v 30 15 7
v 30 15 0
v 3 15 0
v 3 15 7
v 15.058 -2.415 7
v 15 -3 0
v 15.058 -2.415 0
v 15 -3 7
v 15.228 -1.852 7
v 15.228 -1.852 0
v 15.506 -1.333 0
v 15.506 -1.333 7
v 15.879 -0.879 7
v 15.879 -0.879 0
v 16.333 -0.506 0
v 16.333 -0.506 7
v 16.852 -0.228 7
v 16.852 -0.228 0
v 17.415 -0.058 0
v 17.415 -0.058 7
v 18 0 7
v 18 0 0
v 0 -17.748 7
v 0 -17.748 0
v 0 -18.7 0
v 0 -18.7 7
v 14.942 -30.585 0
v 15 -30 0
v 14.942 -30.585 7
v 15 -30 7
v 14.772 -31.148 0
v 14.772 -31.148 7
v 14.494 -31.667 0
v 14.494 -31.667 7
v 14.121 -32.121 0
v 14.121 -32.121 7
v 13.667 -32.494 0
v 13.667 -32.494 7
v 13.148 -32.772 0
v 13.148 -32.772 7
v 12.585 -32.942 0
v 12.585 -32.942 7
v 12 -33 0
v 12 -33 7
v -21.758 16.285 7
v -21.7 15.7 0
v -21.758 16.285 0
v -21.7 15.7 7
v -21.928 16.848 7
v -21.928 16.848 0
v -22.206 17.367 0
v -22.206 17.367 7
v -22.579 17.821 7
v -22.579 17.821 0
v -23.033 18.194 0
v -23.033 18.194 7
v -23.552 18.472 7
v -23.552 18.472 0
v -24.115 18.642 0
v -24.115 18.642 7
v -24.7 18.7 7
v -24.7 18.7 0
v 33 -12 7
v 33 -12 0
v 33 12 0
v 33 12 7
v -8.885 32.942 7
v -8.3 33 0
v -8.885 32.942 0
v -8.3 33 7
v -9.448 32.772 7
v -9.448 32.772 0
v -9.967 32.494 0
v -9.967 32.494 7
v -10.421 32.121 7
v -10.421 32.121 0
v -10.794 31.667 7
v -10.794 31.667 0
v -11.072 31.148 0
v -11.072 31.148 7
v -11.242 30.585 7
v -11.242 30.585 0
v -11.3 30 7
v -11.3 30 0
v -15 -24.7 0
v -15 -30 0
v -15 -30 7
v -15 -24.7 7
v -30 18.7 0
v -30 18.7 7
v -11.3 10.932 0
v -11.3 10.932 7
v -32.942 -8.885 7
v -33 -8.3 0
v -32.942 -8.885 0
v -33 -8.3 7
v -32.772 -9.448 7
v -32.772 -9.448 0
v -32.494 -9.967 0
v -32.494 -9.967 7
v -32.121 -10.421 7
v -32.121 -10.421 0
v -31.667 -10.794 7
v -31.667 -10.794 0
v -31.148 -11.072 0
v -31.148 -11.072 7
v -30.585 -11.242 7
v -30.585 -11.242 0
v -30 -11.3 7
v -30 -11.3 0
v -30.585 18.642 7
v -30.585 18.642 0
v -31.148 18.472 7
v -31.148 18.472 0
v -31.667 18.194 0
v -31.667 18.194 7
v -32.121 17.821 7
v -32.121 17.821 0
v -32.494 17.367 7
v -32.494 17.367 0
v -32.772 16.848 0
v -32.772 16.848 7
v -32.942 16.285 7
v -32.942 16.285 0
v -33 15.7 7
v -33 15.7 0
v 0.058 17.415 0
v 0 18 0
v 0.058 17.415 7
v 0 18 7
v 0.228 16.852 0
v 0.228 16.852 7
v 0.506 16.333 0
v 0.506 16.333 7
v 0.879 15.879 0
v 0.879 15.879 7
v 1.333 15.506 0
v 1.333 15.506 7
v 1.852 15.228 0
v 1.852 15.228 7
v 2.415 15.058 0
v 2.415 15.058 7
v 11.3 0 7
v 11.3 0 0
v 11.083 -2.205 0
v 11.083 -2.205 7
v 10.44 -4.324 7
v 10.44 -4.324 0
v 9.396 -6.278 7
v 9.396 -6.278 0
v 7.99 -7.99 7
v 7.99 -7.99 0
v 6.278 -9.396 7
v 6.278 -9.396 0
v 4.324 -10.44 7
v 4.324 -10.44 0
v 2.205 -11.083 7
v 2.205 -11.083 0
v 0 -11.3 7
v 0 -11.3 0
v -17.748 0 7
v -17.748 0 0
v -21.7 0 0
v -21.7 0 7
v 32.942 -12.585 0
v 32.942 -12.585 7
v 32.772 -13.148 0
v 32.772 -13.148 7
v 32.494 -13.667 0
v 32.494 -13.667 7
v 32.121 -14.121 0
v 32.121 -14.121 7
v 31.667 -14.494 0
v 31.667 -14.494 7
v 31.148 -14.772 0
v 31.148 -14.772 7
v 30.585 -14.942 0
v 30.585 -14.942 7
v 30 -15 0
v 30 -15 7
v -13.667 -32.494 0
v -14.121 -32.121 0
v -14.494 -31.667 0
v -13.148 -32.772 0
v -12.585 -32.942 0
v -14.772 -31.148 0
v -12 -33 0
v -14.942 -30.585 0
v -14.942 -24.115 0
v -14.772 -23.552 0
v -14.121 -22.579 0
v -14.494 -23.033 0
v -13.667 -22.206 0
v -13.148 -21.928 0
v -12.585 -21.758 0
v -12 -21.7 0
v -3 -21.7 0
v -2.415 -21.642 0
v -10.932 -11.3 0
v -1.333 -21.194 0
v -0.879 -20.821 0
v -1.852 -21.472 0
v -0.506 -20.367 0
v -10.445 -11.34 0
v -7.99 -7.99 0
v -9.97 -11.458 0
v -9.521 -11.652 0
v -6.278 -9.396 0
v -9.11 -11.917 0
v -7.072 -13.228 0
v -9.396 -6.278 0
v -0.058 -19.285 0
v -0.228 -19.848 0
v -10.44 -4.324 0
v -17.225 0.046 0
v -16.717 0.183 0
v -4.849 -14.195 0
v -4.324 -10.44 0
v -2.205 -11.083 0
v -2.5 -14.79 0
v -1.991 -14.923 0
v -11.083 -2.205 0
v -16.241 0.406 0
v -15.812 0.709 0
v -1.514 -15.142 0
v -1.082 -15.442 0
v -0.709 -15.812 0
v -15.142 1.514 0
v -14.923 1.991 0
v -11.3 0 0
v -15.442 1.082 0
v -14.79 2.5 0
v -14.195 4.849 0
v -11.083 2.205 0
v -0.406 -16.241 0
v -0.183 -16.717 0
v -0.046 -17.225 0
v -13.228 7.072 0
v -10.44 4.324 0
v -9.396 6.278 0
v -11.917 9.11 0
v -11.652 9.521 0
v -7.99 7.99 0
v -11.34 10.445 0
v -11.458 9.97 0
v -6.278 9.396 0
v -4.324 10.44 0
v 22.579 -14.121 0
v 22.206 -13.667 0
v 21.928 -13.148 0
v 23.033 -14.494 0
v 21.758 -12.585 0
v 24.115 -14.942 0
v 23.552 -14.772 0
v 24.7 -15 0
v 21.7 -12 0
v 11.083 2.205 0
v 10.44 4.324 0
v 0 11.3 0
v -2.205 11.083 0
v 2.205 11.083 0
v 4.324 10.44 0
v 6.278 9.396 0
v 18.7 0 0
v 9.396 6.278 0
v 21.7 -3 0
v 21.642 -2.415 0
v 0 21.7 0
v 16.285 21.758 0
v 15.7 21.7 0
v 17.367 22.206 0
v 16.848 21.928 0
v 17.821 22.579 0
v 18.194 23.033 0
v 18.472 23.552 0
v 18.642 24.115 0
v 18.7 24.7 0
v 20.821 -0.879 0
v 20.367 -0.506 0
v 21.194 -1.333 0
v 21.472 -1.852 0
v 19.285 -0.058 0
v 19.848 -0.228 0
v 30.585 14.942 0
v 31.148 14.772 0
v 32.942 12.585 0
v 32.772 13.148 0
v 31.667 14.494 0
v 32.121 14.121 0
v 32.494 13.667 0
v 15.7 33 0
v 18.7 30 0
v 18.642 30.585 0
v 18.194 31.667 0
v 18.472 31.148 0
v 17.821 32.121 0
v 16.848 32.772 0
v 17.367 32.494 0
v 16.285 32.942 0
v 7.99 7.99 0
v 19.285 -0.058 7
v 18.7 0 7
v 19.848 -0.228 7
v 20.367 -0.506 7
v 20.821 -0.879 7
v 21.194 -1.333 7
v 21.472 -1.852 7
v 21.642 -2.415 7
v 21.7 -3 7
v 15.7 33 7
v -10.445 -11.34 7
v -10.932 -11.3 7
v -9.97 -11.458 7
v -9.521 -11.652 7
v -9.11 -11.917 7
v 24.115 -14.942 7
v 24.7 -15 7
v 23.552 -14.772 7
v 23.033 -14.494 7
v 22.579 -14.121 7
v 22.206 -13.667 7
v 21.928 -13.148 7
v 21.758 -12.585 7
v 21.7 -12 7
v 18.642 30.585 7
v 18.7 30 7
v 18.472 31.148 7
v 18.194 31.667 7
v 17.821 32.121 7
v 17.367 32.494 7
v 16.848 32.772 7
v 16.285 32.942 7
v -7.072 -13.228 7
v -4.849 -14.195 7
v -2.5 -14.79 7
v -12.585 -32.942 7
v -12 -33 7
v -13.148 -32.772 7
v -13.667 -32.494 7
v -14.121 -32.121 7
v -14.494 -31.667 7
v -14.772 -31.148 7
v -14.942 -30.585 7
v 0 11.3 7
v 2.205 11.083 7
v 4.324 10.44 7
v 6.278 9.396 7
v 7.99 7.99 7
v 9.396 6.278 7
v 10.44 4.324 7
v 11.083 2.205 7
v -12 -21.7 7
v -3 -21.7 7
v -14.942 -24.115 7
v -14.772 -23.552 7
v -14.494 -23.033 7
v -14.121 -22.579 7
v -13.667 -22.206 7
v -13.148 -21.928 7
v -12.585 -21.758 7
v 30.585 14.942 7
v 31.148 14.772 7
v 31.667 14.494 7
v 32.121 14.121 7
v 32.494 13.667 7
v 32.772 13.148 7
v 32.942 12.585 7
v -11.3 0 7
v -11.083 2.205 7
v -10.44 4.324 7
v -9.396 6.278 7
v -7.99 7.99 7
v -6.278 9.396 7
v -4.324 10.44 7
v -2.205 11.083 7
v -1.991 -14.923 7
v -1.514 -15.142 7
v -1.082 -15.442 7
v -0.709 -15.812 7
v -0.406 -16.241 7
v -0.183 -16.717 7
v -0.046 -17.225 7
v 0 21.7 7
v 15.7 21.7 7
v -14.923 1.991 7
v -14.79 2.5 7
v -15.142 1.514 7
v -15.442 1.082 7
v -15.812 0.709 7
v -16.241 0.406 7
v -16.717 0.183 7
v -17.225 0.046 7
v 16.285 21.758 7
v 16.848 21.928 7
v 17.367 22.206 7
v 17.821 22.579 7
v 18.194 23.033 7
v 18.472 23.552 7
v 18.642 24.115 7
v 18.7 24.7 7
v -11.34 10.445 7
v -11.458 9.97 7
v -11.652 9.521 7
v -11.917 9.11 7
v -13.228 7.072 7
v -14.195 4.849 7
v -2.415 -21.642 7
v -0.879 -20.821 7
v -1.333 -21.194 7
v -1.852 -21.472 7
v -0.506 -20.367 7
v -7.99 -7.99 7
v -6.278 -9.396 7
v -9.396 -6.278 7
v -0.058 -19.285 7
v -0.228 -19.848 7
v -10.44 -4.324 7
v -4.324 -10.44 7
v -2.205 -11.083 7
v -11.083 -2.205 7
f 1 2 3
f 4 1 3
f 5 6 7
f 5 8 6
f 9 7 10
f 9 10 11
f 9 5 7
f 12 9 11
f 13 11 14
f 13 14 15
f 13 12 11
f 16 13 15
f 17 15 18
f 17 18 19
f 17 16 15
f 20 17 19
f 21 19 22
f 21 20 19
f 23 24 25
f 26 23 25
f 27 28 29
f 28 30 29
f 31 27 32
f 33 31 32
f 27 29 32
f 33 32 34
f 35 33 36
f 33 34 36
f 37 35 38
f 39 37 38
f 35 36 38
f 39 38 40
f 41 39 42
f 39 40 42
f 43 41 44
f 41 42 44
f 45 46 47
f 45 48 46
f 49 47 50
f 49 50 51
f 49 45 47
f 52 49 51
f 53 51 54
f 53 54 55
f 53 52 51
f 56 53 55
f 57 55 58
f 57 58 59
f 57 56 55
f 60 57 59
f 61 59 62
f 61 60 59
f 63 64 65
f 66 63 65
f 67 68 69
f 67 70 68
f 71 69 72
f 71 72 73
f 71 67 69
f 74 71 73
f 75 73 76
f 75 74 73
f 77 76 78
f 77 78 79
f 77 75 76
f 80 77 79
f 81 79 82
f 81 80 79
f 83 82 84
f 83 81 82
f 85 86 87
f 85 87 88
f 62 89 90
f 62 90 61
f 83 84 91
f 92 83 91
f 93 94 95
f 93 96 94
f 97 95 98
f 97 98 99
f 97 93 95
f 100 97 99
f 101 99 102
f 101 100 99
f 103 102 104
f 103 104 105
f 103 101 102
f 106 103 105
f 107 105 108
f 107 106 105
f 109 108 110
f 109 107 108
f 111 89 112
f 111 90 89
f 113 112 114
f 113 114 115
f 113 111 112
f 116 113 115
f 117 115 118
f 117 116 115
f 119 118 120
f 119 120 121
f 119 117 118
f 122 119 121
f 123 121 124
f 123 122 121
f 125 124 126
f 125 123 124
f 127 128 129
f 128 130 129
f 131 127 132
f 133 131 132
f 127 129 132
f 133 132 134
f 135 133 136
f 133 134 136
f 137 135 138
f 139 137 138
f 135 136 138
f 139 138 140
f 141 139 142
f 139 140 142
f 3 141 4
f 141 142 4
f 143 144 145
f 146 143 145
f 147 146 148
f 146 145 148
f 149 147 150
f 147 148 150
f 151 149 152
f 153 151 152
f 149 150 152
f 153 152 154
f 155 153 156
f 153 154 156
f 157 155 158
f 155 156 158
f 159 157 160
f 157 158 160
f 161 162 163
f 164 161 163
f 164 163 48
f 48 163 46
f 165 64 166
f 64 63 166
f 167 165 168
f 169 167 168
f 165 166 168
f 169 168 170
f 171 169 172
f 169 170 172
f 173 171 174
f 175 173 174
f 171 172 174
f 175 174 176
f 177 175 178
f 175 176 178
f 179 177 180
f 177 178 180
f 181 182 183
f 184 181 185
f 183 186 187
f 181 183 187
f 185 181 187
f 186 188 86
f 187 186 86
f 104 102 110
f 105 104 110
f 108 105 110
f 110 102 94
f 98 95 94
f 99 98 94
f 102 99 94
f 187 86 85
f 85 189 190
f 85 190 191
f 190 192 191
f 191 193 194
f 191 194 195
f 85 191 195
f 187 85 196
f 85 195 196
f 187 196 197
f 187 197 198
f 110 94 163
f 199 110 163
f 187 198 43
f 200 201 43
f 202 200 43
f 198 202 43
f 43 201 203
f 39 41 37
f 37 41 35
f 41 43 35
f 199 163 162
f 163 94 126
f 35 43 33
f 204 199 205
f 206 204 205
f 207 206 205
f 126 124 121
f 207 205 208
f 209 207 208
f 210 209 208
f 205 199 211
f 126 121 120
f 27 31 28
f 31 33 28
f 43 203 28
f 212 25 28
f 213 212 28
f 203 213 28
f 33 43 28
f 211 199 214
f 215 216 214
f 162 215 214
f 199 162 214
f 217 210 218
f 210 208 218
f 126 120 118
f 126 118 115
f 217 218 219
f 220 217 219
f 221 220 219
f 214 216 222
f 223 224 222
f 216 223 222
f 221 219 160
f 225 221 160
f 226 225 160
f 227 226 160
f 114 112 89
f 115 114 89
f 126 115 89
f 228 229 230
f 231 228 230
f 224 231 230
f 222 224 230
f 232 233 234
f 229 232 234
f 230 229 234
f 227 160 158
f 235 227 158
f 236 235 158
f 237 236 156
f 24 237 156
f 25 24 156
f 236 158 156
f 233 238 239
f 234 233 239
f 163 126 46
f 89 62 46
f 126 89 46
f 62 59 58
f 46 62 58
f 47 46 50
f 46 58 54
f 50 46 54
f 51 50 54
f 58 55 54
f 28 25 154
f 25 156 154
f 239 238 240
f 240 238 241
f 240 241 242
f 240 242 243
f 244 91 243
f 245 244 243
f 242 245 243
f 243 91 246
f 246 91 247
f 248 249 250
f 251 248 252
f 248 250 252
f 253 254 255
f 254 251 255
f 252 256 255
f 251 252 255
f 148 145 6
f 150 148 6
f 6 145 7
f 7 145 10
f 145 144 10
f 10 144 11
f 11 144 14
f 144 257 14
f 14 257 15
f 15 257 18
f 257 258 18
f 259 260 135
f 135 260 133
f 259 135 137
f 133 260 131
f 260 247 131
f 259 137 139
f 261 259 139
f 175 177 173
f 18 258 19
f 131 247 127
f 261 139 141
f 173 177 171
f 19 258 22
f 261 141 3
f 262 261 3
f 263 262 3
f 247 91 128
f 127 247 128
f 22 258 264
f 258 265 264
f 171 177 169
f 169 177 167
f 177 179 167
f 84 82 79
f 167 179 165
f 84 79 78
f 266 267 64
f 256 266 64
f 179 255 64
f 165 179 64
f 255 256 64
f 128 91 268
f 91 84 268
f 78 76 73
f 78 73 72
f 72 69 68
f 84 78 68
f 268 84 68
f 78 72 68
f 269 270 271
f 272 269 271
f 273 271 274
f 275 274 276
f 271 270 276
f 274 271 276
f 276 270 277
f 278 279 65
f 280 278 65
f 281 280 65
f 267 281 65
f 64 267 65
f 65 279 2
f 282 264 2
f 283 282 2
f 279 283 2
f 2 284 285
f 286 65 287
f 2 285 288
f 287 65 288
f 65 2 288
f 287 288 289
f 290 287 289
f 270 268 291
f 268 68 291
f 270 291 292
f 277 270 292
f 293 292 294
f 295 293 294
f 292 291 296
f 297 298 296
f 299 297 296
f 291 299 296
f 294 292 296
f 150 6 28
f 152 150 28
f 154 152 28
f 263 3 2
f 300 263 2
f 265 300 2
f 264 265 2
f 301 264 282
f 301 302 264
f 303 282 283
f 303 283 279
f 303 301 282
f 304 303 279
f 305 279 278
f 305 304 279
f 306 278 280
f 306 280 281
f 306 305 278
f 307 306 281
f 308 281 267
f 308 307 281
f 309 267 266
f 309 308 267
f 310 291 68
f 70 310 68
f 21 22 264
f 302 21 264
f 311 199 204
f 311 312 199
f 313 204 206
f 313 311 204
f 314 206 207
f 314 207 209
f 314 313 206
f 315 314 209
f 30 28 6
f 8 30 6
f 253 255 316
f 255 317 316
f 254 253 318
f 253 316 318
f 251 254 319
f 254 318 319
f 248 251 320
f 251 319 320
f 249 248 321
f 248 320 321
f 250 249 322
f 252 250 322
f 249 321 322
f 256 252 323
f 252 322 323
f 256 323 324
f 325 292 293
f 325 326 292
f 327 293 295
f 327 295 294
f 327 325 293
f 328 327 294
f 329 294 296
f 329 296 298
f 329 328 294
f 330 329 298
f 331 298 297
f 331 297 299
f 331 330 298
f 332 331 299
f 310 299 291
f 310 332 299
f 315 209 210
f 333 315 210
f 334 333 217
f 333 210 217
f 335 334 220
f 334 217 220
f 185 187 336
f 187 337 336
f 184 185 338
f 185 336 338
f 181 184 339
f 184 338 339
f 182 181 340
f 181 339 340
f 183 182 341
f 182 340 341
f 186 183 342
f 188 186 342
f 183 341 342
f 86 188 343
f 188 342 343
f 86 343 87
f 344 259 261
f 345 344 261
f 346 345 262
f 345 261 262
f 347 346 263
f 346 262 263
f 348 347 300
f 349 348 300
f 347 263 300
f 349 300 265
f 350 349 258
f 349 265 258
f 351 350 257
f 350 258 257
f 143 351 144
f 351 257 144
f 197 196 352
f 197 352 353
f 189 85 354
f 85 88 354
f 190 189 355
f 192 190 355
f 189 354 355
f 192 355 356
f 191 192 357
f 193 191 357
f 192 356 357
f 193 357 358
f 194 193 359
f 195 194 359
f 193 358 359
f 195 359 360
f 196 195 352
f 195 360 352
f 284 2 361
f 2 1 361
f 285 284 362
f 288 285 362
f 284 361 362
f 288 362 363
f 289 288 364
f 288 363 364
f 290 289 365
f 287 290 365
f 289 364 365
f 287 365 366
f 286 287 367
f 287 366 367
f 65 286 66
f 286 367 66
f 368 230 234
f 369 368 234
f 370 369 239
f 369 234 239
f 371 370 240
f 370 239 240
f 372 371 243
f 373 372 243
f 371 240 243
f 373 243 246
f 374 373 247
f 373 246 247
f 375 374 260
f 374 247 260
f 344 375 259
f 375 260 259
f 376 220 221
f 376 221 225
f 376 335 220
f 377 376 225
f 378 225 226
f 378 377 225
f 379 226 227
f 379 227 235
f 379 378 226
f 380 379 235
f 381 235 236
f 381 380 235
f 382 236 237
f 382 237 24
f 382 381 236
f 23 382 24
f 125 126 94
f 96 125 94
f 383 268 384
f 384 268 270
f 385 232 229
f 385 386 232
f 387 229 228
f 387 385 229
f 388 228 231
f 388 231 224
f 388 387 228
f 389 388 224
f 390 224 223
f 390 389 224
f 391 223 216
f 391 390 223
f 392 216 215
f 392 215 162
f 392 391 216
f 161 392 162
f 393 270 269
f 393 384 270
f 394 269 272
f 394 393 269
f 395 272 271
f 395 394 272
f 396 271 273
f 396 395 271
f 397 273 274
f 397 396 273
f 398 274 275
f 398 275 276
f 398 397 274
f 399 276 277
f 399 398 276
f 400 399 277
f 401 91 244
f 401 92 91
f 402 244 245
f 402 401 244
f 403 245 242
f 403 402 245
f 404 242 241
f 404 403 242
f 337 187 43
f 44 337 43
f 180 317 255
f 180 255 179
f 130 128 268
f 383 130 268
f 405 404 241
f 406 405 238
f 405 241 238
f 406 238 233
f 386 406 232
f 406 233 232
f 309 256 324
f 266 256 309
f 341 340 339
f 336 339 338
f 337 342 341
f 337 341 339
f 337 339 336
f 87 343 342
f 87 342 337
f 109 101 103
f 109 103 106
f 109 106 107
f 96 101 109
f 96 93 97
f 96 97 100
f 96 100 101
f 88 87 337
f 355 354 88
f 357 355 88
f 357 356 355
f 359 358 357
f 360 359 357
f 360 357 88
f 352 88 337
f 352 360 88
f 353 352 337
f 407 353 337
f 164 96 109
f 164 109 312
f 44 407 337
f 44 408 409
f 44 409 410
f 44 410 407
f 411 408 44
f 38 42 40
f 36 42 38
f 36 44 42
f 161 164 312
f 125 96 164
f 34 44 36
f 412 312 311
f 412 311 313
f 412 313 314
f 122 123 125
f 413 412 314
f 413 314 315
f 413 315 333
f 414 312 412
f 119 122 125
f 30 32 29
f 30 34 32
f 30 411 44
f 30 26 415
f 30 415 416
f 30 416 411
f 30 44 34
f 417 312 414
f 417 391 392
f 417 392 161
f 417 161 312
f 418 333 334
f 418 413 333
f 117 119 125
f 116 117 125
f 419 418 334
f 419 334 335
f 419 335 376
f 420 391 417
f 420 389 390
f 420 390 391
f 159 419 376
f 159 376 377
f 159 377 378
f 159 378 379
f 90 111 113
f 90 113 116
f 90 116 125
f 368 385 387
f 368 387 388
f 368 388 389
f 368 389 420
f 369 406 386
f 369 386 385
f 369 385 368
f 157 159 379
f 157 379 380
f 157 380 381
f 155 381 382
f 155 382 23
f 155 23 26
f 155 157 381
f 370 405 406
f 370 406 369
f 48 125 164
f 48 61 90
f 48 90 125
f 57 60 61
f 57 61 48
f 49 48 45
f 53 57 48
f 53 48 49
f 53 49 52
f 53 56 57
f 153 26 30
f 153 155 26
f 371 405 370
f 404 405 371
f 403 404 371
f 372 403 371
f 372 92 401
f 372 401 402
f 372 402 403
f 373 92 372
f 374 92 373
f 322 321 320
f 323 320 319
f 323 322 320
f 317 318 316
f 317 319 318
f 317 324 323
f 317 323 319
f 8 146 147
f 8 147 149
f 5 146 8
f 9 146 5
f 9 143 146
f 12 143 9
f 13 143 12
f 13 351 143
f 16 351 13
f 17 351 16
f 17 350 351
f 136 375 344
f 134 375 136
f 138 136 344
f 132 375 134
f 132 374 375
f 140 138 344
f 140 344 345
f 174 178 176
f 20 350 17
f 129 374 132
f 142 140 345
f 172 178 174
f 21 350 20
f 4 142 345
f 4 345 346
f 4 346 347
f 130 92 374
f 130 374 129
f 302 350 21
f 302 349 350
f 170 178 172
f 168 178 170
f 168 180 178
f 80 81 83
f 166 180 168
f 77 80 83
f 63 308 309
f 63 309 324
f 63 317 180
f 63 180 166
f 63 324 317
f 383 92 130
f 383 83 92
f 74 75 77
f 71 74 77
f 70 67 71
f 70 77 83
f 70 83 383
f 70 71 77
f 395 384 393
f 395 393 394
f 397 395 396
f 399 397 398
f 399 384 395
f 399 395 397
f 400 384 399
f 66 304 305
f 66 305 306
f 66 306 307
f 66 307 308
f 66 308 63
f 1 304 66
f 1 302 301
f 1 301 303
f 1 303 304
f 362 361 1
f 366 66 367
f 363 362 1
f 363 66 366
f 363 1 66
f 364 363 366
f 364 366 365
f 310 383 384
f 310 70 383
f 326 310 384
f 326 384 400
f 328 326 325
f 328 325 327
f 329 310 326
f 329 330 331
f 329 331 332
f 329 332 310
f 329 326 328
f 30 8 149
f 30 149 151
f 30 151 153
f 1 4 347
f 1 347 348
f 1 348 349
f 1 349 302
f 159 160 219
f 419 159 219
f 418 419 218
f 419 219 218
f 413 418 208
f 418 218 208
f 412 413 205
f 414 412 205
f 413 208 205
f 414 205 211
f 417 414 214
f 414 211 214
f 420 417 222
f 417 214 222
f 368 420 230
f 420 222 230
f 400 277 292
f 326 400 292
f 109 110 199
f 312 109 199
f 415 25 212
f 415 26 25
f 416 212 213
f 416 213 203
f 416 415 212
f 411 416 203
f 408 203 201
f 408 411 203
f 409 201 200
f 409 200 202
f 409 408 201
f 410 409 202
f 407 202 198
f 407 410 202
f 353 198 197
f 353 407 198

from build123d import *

# Parameters (mm, degrees)
F0_W     = 11.3
F0_H     = 11.3
F0_H_2   = 18.7
F0_W_2   = 18.7
F0_H_3   = 15
F0_W_3   = 15
F1_DEPTH = 7
F2_R     = 3
F3_R     = 3


with BuildPart() as f1:
    # F0 (on Top) → F1 (new body)
    with BuildSketch(Plane.XY):
        with BuildLine():
            Line((-11.3, 9.8645831133), (-11.3, 0))
            ThreePointArc((-11.3, 0), (-7.9903066274, 7.9903066274), (0, 11.3))
            Line((0, 11.3), (0, 15))
            ThreePointArc((0, 15), (-6.2060959266, 13.6559281395), (-11.3, 9.8645831133))
        make_face()
        with BuildLine():
            Line((-15, 0), (-11.3, 0))
            Line((-11.3, 0), (-11.3, 9.8645831133))
            ThreePointArc((-11.3, 9.8645831133), (-14.0445719052, 5.2678268764), (-15, 0))
        make_face()
        with BuildLine():
            ThreePointArc((0, -11.3), (-7.9903066274, -7.9903066274), (-11.3, 0))
            Line((-11.3, 0), (-15, 0))
            ThreePointArc((-15, 0), (-13.6559281395, -6.2060959266), (-9.8645831133, -11.3))
            Line((-9.8645831133, -11.3), (0, -11.3))
        make_face()
        with BuildLine():
            ThreePointArc((-9.8645831133, -11.3), (-13.6559281395, -6.2060959266), (-15, 0))
            Line((-15, 0), (-21.7, 0))
            Line((-21.7, 0), (-21.7, -11.3))
            Line((-21.7, -11.3), (-9.8645831133, -11.3))
        make_face()
        with Locations((-27.35, -5.65)):
            Rectangle(F0_W, F0_H)
        with Locations((-27.35, 9.35)):
            Rectangle(F0_W, F0_H_2)
        with BuildLine():
            Line((-11.3, 21.7), (-11.3, 9.8645831133))
            ThreePointArc((-11.3, 9.8645831133), (-6.2060959266, 13.6559281395), (0, 15))
            Line((0, 15), (0, 21.7))
            Line((0, 21.7), (-11.3, 21.7))
        make_face()
        with Locations((-5.65, 27.35)):
            Rectangle(F0_W, F0_H)
        with Locations((9.35, 27.35)):
            Rectangle(F0_W_2, F0_H)
        with BuildLine():
            Line((21.7, 15), (0, 15))
            ThreePointArc((0, 15), (10.6066017178, 10.6066017178), (15, 0))
            Line((15, 0), (21.7, 0))
            Line((21.7, 0), (21.7, 15))
        make_face()
        with Locations((27.35, 7.5)):
            Rectangle(F0_W, F0_H_3)
        with Locations((27.35, -7.5)):
            Rectangle(F0_W, F0_H_3)
        with BuildLine():
            ThreePointArc((15, 0), (10.6066017178, -10.6066017178), (0, -15))
            Line((0, -15), (0, -21.7))
            Line((0, -21.7), (15, -21.7))
            Line((15, -21.7), (15, 0))
        make_face()
        with Locations((7.5, -27.35)):
            Rectangle(F0_W_3, F0_H)
        with Locations((-7.5, -27.35)):
            Rectangle(F0_W_3, F0_H)
        with BuildLine():
            ThreePointArc((11.3, 0), (7.9903066274, -7.9903066274), (0, -11.3))
            Line((0, -11.3), (0, -15))
            ThreePointArc((0, -15), (10.6066017178, -10.6066017178), (15, 0))
            Line((15, 0), (11.3, 0))
        make_face()
        with BuildLine():
            Line((0, -15), (0, -11.3))
            Line((0, -11.3), (-9.8645831133, -11.3))
            ThreePointArc((-9.8645831133, -11.3), (-5.2678268764, -14.0445719052), (0, -15))
        make_face()
        with BuildLine():
            Line((0, 15), (0, 11.3))
            ThreePointArc((0, 11.3), (7.9903066274, 7.9903066274), (11.3, 0))
            Line((11.3, 0), (15, 0))
            ThreePointArc((15, 0), (10.6066017178, 10.6066017178), (0, 15))
        make_face()
    extrude(amount=F1_DEPTH)

    # F2
    f2_edges = [f1.edges().sort_by_distance(p)[0] for p in [
        (21.7, 0, 3.5),
        (0, -21.7, 3.5),
        (-15, 0, 3.5),
        (0, 15, 3.5),
        (-11.3, 9.864583, 3.5),
        (0, -15, 3.5),
        (-9.864583, -11.3, 3.5),
        (15, 0, 3.5),
    ]]
    fillet(f2_edges, radius=F2_R)

    # F3
    f3_edges = [f1.edges().sort_by_distance(p)[0] for p in [
        (-33, -11.3, 3.5),
        (-15, -33, 3.5),
        (-33, 18.7, 3.5),
        (-21.7, 18.7, 3.5),
        (-15, -21.7, 3.5),
        (15, -33, 3.5),
        (21.7, -15, 3.5),
        (33, -15, 3.5),
        (33, 15, 3.5),
        (18.7, 21.7, 3.5),
        (18.7, 33, 3.5),
        (-11.3, 33, 3.5),
    ]]
    fillet(f3_edges, radius=F3_R)


solid = f1.part
